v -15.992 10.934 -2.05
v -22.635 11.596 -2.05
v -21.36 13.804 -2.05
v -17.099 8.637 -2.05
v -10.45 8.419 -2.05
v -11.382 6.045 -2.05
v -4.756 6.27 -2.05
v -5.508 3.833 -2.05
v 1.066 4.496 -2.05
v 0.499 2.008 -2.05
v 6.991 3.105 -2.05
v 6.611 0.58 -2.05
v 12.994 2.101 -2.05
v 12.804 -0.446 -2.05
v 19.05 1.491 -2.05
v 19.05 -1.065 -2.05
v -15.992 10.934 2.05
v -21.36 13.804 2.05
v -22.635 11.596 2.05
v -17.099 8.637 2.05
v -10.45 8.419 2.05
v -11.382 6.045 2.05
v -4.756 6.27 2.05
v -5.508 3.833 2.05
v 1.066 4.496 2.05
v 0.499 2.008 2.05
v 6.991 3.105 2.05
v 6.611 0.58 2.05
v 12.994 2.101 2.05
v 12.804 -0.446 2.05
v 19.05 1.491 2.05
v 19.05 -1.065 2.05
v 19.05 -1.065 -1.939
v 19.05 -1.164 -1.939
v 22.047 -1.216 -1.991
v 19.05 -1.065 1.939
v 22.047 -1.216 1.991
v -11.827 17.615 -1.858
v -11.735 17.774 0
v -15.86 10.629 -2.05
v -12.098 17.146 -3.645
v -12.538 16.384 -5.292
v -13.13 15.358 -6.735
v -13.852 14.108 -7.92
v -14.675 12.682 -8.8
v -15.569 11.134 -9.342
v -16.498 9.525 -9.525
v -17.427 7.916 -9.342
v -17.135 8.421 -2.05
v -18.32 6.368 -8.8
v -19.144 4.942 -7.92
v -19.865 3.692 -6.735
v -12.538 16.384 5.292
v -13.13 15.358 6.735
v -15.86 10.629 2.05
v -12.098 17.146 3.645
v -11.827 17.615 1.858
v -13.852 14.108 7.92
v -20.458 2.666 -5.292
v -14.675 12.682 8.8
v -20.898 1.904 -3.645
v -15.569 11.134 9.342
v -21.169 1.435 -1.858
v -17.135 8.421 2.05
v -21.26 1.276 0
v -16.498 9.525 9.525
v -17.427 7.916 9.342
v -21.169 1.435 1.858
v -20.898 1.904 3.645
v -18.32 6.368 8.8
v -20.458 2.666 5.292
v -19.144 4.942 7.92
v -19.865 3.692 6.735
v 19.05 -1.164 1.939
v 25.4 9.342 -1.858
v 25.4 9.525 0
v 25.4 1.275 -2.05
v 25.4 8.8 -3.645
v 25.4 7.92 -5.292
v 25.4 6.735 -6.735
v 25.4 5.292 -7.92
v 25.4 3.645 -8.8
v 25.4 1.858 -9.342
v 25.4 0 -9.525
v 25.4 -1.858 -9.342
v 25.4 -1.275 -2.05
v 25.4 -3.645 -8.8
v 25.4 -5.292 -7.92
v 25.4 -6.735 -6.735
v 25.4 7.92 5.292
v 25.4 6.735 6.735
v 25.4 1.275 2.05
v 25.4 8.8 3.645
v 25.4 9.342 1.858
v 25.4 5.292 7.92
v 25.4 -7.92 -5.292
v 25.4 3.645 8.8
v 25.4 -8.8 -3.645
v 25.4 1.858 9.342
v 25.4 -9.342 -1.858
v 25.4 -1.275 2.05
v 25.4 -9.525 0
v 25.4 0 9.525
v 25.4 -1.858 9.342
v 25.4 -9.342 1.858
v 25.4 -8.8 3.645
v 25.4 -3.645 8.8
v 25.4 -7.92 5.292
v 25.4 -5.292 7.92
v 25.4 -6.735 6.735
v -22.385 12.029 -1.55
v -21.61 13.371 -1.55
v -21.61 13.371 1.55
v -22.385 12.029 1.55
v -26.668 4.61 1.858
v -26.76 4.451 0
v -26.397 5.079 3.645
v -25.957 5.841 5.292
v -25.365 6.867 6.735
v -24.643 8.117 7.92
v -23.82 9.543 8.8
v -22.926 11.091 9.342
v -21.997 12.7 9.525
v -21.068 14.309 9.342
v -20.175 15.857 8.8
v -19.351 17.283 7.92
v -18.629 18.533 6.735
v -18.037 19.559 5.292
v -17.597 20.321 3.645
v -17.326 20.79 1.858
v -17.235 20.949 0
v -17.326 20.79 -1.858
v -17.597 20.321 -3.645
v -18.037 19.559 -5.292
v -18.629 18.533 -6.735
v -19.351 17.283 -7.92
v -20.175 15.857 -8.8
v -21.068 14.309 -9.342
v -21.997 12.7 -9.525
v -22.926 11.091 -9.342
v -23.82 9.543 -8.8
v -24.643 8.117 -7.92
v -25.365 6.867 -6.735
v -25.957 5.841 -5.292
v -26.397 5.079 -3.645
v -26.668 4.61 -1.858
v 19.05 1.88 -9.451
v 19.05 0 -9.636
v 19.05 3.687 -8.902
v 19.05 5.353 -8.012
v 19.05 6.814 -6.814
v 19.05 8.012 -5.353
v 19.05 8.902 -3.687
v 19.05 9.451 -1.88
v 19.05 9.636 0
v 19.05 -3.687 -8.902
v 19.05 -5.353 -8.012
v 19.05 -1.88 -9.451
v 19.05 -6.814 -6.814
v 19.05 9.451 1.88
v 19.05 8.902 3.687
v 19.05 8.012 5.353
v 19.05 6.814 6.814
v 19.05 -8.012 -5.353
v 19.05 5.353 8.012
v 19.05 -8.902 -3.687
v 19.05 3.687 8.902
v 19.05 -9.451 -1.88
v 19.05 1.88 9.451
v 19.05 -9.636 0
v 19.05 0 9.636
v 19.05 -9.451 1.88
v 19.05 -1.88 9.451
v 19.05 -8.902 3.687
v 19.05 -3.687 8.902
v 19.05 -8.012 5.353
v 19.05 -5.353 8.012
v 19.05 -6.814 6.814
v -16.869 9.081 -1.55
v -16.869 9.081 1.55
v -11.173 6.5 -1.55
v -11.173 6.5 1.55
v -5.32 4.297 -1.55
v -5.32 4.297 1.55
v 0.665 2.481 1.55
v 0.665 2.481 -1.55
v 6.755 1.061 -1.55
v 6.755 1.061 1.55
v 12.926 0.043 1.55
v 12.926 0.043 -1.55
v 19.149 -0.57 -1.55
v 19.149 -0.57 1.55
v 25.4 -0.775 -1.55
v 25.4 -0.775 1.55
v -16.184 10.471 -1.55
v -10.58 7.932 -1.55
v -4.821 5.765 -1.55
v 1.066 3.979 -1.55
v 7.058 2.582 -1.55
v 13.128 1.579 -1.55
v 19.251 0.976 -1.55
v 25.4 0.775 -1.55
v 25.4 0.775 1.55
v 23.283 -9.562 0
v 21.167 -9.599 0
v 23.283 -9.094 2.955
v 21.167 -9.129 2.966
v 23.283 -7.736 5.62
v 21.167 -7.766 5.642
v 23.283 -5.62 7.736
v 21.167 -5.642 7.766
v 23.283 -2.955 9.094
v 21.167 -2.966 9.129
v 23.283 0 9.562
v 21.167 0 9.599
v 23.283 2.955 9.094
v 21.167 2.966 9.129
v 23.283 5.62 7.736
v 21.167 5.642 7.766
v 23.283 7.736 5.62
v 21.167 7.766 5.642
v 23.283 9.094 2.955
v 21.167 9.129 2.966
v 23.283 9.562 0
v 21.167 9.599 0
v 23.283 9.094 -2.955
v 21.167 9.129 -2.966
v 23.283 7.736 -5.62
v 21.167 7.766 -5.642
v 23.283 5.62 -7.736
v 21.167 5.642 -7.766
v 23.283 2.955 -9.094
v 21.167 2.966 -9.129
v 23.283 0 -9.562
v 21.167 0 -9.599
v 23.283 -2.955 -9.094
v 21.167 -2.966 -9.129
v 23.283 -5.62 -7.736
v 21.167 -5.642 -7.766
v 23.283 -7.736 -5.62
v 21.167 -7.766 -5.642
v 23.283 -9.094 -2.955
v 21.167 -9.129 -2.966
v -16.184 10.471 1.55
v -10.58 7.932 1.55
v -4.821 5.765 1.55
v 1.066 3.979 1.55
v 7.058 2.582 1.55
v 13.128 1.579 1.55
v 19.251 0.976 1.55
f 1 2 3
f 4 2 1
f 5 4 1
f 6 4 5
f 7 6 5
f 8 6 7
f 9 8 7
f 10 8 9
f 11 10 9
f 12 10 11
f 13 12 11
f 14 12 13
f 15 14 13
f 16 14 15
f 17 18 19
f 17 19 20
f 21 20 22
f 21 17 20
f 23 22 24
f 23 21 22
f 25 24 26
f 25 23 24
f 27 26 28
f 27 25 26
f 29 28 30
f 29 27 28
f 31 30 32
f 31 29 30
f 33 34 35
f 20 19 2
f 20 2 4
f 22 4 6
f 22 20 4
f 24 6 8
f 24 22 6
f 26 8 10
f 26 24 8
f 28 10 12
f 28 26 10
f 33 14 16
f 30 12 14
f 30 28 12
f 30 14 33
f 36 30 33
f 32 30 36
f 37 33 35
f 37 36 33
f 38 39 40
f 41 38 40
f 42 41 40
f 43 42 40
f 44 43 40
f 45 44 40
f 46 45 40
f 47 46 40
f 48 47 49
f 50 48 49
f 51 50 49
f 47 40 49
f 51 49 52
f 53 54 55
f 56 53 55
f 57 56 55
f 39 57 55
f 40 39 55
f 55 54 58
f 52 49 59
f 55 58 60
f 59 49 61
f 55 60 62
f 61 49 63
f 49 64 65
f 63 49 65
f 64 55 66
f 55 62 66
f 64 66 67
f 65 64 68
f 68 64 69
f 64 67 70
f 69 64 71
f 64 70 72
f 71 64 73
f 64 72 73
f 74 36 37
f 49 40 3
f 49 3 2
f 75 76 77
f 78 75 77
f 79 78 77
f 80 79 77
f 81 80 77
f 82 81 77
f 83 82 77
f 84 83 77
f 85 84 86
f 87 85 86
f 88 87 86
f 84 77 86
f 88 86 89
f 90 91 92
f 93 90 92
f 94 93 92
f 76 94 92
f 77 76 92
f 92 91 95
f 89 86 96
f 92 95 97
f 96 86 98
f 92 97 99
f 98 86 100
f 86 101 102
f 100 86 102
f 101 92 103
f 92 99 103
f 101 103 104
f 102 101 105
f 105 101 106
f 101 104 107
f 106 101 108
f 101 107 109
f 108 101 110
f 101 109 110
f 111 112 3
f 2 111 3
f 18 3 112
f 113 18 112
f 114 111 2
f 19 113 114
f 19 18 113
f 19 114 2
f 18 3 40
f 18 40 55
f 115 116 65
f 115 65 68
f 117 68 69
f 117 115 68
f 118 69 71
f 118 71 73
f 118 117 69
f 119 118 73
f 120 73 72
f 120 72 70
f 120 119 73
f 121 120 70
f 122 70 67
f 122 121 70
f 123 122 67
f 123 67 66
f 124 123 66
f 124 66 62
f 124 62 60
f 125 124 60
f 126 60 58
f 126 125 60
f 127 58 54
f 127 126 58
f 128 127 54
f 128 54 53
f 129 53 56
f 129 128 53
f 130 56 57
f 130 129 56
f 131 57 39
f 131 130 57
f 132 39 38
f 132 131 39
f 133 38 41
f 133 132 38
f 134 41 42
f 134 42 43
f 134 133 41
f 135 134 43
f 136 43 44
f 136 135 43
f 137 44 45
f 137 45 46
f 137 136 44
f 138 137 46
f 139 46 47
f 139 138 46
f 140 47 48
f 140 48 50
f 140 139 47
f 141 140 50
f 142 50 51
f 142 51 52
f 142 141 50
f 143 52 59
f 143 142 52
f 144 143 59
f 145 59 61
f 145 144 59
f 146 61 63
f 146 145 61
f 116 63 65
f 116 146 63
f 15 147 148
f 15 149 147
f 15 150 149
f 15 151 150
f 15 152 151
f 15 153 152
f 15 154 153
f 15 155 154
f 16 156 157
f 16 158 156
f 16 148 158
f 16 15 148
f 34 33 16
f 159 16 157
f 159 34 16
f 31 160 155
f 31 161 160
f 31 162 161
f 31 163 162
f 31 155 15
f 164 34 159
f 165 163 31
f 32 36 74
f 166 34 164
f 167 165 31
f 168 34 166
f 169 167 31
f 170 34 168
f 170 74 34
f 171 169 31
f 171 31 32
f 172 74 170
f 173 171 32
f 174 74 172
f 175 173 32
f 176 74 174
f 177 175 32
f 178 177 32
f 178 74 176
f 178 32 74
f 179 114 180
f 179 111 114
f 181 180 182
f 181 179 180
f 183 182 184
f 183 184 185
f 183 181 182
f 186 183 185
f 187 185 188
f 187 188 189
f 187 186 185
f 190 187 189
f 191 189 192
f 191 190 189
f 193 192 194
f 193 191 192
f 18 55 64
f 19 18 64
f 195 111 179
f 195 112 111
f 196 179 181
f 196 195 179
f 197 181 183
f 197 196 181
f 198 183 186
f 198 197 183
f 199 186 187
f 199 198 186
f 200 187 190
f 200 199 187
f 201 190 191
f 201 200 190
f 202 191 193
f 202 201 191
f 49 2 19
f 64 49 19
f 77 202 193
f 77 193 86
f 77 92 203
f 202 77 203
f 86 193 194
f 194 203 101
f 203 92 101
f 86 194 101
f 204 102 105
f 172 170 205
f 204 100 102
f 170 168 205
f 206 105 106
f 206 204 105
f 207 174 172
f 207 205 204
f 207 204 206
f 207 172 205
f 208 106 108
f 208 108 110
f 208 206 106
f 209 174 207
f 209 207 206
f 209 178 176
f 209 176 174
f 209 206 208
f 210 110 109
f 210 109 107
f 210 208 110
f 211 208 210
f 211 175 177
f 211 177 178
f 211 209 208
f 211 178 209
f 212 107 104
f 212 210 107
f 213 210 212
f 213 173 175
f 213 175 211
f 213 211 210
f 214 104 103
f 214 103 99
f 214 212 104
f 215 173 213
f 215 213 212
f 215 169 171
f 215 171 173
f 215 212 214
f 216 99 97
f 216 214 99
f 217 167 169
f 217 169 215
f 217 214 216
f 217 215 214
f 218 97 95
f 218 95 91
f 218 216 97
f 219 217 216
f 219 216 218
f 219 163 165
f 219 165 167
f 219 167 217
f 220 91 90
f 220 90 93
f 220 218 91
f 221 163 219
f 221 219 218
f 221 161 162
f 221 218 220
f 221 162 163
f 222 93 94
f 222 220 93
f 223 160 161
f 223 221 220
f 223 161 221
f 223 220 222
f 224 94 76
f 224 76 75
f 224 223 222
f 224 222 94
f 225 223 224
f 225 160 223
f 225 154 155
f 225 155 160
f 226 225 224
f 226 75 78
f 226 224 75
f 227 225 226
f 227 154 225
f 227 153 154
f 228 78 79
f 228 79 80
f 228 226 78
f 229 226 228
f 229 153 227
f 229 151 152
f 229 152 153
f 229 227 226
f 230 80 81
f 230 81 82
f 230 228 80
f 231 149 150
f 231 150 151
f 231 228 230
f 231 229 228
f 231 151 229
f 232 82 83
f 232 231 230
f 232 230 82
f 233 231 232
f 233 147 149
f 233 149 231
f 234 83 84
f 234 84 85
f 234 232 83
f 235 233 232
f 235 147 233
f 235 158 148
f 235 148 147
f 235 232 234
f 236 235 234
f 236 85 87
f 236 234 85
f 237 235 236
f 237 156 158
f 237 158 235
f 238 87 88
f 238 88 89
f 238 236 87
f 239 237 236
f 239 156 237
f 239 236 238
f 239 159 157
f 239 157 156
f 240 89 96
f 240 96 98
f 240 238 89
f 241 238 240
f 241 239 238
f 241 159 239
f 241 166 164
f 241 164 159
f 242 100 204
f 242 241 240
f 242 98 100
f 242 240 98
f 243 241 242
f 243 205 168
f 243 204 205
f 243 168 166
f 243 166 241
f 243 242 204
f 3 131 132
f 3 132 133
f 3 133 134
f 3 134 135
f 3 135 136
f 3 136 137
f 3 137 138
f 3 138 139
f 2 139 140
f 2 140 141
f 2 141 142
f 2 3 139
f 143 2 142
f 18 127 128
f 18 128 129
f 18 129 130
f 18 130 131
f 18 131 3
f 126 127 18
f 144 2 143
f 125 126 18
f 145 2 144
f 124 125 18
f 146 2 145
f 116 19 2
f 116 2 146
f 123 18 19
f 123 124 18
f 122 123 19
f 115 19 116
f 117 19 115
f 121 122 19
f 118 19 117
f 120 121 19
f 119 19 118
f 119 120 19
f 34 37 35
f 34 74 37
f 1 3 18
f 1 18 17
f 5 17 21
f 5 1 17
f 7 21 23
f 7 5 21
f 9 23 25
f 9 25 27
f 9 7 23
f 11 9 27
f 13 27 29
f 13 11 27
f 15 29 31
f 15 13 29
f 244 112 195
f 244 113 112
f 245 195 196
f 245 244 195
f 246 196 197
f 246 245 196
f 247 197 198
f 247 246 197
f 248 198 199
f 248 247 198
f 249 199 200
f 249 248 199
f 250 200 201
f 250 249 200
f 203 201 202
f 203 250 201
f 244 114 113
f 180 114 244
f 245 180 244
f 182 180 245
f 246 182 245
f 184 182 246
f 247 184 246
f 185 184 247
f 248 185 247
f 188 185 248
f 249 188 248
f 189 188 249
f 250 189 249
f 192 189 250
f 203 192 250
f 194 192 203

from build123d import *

# Parameters (mm, degrees)
F4_W     = 2.55
F4_H     = 4.1
F4_W_2   = 1.55
F4_H_2   = 3.1
F3_W     = 2.55
F3_H     = 4.1
F3_W_2   = 1.55
F3_H_2   = 3.1
F3_R     = 9.525
F7_DEPTH = 6.35
F4_R     = 9.525
F8_DEPTH = 6.35
F8_TAPER = -1


# Not quite as in the source:
# - a feature of the source that left no trace in its solid (it failed there, or was rolled back) is left out


with BuildPart() as f5:
    # F5: sweep along a path in F0
    with BuildLine(Plane.XY) as f5_path:
        ThreePointArc((-21.9970452561, 12.7), (0.8654840123, 3.2300303069), (25.4, 0))
    # F4 (on line) + F3 (on line) → F5 (sweep)
    with BuildSketch(Plane(origin=(25.4, 0, 0), x_dir=(0, -1, 0), z_dir=(-1, 0, 0))):
        Rectangle(F4_W, F4_H)
        Rectangle(F4_W_2, F4_H_2, mode=Mode.SUBTRACT)
    with BuildSketch(Plane(origin=(-21.9970452561, 12.7, 0), x_dir=(-0.5, -0.8660254038, 0), z_dir=(-0.8660254038, 0.5, 0))):
        Rectangle(F3_W, F3_H)
        Rectangle(F3_W_2, F3_H_2, mode=Mode.SUBTRACT)
    sweep(path=f5_path.line)

    # F4 (on line) → F8 (join)
    with BuildSketch(Plane(origin=(25.4, 0, 0), x_dir=(0, -1, 0), z_dir=(-1, 0, 0))):
        Circle(F4_R)
        Rectangle(F4_W, F4_H, mode=Mode.SUBTRACT)
    extrude(amount=F8_DEPTH, taper=F8_TAPER)


with BuildPart() as f7:
    # F3 (on line) → F7 (new body)
    with BuildSketch(Plane(origin=(-21.9970452561, 12.7, 0), x_dir=(-0.5, -0.8660254038, 0), z_dir=(-0.8660254038, 0.5, 0))):
        Circle(F3_R)
        Rectangle(F3_W, F3_H, mode=Mode.SUBTRACT)
    extrude(amount=-F7_DEPTH)


solid = Compound([f5.part, f7.part])
